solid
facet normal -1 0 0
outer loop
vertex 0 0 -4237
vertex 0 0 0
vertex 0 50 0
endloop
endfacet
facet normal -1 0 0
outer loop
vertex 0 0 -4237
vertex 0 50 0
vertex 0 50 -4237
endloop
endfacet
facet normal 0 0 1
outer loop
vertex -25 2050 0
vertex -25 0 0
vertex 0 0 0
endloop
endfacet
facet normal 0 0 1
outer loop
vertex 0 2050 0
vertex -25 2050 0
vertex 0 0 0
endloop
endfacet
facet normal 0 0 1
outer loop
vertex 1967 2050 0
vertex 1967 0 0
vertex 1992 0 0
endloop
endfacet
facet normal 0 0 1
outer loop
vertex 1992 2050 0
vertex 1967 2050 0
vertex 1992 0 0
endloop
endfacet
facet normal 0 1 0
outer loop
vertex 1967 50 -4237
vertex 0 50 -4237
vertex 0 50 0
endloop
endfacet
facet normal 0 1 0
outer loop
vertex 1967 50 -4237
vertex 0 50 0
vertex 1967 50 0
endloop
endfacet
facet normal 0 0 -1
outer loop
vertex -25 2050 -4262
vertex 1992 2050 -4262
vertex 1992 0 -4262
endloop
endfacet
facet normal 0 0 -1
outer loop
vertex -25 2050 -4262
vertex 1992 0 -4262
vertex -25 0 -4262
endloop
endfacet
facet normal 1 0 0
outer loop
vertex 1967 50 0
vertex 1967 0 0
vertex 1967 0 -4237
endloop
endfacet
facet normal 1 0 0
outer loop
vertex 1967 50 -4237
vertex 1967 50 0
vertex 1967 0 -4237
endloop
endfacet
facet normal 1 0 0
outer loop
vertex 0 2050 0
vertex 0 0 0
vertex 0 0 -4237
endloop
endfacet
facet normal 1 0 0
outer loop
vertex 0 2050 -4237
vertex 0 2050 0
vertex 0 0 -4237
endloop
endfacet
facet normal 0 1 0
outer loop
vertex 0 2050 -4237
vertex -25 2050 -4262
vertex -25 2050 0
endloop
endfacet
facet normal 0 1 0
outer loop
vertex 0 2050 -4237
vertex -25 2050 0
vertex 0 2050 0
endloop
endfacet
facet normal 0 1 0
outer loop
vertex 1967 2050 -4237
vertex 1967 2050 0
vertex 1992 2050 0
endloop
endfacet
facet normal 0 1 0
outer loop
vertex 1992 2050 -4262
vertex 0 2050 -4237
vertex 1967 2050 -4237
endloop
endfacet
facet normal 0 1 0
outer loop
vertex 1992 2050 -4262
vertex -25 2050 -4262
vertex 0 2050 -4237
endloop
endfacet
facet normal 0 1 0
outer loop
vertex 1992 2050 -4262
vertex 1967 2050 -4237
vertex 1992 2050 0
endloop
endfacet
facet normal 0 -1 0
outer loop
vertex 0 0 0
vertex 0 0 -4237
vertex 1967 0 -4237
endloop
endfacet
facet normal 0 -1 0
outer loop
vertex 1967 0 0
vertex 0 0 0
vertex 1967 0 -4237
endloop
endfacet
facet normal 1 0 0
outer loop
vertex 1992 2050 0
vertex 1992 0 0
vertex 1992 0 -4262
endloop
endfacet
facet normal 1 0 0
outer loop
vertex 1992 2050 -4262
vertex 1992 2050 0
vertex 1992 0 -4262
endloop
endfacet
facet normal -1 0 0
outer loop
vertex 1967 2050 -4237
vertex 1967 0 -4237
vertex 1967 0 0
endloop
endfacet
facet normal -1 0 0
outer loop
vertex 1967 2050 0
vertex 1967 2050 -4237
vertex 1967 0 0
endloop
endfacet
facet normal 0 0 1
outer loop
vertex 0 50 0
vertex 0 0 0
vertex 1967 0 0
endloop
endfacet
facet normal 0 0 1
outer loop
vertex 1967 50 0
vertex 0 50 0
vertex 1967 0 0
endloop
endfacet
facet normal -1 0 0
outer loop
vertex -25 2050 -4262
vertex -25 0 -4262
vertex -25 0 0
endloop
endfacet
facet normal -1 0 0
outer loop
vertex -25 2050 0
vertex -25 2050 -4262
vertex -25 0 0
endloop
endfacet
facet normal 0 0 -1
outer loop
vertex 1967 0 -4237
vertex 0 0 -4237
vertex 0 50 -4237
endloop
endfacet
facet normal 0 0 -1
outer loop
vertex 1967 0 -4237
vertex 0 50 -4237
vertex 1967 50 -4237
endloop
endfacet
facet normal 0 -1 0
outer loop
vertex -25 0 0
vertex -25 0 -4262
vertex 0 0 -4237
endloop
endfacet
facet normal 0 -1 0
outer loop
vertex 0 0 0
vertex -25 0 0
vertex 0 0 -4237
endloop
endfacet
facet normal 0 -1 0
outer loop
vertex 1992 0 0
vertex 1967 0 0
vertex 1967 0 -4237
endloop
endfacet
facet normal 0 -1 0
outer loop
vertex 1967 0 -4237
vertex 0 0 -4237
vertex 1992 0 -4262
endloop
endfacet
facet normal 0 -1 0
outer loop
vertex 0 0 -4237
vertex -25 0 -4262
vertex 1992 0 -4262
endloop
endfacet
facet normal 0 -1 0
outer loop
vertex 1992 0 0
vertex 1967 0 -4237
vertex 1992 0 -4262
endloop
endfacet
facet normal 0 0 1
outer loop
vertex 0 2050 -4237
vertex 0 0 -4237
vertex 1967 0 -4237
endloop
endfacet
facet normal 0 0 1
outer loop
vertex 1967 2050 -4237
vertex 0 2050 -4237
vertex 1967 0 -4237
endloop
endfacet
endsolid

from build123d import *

# Parameters (mm, degrees)
SKETCH1_W           = 1967
SKETCH1_H           = 4237
BOSS_EXTRUDE1_DEPTH = 50
BOSS_EXTRUDE2_DEPTH = 2050


with BuildPart() as part:
    # Sketch1 → Boss-Extrude1 (new body)
    with BuildSketch(Plane(origin=(0, 0, 0), x_dir=(1, 0, 0), z_dir=(0, 1, 0))):
        with Locations((983.5, 2118.5)):
            Rectangle(SKETCH1_W, SKETCH1_H)
    extrude(amount=BOSS_EXTRUDE1_DEPTH)


with BuildPart() as body_2:
    # Sketch1<7> → Boss-Extrude2 (new body)
    with BuildSketch(Plane(origin=(0, 0, 0), x_dir=(1, 0, 0), z_dir=(0, 1, 0))):
        Polygon((1967, 0), (1992, 0), (1992, 4262), (-25, 4262), (-25, 0), (0, 0), (0, 4237), (1967, 4237), align=None)
    extrude(amount=BOSS_EXTRUDE2_DEPTH)


solid = Compound([part.part, body_2.part])
